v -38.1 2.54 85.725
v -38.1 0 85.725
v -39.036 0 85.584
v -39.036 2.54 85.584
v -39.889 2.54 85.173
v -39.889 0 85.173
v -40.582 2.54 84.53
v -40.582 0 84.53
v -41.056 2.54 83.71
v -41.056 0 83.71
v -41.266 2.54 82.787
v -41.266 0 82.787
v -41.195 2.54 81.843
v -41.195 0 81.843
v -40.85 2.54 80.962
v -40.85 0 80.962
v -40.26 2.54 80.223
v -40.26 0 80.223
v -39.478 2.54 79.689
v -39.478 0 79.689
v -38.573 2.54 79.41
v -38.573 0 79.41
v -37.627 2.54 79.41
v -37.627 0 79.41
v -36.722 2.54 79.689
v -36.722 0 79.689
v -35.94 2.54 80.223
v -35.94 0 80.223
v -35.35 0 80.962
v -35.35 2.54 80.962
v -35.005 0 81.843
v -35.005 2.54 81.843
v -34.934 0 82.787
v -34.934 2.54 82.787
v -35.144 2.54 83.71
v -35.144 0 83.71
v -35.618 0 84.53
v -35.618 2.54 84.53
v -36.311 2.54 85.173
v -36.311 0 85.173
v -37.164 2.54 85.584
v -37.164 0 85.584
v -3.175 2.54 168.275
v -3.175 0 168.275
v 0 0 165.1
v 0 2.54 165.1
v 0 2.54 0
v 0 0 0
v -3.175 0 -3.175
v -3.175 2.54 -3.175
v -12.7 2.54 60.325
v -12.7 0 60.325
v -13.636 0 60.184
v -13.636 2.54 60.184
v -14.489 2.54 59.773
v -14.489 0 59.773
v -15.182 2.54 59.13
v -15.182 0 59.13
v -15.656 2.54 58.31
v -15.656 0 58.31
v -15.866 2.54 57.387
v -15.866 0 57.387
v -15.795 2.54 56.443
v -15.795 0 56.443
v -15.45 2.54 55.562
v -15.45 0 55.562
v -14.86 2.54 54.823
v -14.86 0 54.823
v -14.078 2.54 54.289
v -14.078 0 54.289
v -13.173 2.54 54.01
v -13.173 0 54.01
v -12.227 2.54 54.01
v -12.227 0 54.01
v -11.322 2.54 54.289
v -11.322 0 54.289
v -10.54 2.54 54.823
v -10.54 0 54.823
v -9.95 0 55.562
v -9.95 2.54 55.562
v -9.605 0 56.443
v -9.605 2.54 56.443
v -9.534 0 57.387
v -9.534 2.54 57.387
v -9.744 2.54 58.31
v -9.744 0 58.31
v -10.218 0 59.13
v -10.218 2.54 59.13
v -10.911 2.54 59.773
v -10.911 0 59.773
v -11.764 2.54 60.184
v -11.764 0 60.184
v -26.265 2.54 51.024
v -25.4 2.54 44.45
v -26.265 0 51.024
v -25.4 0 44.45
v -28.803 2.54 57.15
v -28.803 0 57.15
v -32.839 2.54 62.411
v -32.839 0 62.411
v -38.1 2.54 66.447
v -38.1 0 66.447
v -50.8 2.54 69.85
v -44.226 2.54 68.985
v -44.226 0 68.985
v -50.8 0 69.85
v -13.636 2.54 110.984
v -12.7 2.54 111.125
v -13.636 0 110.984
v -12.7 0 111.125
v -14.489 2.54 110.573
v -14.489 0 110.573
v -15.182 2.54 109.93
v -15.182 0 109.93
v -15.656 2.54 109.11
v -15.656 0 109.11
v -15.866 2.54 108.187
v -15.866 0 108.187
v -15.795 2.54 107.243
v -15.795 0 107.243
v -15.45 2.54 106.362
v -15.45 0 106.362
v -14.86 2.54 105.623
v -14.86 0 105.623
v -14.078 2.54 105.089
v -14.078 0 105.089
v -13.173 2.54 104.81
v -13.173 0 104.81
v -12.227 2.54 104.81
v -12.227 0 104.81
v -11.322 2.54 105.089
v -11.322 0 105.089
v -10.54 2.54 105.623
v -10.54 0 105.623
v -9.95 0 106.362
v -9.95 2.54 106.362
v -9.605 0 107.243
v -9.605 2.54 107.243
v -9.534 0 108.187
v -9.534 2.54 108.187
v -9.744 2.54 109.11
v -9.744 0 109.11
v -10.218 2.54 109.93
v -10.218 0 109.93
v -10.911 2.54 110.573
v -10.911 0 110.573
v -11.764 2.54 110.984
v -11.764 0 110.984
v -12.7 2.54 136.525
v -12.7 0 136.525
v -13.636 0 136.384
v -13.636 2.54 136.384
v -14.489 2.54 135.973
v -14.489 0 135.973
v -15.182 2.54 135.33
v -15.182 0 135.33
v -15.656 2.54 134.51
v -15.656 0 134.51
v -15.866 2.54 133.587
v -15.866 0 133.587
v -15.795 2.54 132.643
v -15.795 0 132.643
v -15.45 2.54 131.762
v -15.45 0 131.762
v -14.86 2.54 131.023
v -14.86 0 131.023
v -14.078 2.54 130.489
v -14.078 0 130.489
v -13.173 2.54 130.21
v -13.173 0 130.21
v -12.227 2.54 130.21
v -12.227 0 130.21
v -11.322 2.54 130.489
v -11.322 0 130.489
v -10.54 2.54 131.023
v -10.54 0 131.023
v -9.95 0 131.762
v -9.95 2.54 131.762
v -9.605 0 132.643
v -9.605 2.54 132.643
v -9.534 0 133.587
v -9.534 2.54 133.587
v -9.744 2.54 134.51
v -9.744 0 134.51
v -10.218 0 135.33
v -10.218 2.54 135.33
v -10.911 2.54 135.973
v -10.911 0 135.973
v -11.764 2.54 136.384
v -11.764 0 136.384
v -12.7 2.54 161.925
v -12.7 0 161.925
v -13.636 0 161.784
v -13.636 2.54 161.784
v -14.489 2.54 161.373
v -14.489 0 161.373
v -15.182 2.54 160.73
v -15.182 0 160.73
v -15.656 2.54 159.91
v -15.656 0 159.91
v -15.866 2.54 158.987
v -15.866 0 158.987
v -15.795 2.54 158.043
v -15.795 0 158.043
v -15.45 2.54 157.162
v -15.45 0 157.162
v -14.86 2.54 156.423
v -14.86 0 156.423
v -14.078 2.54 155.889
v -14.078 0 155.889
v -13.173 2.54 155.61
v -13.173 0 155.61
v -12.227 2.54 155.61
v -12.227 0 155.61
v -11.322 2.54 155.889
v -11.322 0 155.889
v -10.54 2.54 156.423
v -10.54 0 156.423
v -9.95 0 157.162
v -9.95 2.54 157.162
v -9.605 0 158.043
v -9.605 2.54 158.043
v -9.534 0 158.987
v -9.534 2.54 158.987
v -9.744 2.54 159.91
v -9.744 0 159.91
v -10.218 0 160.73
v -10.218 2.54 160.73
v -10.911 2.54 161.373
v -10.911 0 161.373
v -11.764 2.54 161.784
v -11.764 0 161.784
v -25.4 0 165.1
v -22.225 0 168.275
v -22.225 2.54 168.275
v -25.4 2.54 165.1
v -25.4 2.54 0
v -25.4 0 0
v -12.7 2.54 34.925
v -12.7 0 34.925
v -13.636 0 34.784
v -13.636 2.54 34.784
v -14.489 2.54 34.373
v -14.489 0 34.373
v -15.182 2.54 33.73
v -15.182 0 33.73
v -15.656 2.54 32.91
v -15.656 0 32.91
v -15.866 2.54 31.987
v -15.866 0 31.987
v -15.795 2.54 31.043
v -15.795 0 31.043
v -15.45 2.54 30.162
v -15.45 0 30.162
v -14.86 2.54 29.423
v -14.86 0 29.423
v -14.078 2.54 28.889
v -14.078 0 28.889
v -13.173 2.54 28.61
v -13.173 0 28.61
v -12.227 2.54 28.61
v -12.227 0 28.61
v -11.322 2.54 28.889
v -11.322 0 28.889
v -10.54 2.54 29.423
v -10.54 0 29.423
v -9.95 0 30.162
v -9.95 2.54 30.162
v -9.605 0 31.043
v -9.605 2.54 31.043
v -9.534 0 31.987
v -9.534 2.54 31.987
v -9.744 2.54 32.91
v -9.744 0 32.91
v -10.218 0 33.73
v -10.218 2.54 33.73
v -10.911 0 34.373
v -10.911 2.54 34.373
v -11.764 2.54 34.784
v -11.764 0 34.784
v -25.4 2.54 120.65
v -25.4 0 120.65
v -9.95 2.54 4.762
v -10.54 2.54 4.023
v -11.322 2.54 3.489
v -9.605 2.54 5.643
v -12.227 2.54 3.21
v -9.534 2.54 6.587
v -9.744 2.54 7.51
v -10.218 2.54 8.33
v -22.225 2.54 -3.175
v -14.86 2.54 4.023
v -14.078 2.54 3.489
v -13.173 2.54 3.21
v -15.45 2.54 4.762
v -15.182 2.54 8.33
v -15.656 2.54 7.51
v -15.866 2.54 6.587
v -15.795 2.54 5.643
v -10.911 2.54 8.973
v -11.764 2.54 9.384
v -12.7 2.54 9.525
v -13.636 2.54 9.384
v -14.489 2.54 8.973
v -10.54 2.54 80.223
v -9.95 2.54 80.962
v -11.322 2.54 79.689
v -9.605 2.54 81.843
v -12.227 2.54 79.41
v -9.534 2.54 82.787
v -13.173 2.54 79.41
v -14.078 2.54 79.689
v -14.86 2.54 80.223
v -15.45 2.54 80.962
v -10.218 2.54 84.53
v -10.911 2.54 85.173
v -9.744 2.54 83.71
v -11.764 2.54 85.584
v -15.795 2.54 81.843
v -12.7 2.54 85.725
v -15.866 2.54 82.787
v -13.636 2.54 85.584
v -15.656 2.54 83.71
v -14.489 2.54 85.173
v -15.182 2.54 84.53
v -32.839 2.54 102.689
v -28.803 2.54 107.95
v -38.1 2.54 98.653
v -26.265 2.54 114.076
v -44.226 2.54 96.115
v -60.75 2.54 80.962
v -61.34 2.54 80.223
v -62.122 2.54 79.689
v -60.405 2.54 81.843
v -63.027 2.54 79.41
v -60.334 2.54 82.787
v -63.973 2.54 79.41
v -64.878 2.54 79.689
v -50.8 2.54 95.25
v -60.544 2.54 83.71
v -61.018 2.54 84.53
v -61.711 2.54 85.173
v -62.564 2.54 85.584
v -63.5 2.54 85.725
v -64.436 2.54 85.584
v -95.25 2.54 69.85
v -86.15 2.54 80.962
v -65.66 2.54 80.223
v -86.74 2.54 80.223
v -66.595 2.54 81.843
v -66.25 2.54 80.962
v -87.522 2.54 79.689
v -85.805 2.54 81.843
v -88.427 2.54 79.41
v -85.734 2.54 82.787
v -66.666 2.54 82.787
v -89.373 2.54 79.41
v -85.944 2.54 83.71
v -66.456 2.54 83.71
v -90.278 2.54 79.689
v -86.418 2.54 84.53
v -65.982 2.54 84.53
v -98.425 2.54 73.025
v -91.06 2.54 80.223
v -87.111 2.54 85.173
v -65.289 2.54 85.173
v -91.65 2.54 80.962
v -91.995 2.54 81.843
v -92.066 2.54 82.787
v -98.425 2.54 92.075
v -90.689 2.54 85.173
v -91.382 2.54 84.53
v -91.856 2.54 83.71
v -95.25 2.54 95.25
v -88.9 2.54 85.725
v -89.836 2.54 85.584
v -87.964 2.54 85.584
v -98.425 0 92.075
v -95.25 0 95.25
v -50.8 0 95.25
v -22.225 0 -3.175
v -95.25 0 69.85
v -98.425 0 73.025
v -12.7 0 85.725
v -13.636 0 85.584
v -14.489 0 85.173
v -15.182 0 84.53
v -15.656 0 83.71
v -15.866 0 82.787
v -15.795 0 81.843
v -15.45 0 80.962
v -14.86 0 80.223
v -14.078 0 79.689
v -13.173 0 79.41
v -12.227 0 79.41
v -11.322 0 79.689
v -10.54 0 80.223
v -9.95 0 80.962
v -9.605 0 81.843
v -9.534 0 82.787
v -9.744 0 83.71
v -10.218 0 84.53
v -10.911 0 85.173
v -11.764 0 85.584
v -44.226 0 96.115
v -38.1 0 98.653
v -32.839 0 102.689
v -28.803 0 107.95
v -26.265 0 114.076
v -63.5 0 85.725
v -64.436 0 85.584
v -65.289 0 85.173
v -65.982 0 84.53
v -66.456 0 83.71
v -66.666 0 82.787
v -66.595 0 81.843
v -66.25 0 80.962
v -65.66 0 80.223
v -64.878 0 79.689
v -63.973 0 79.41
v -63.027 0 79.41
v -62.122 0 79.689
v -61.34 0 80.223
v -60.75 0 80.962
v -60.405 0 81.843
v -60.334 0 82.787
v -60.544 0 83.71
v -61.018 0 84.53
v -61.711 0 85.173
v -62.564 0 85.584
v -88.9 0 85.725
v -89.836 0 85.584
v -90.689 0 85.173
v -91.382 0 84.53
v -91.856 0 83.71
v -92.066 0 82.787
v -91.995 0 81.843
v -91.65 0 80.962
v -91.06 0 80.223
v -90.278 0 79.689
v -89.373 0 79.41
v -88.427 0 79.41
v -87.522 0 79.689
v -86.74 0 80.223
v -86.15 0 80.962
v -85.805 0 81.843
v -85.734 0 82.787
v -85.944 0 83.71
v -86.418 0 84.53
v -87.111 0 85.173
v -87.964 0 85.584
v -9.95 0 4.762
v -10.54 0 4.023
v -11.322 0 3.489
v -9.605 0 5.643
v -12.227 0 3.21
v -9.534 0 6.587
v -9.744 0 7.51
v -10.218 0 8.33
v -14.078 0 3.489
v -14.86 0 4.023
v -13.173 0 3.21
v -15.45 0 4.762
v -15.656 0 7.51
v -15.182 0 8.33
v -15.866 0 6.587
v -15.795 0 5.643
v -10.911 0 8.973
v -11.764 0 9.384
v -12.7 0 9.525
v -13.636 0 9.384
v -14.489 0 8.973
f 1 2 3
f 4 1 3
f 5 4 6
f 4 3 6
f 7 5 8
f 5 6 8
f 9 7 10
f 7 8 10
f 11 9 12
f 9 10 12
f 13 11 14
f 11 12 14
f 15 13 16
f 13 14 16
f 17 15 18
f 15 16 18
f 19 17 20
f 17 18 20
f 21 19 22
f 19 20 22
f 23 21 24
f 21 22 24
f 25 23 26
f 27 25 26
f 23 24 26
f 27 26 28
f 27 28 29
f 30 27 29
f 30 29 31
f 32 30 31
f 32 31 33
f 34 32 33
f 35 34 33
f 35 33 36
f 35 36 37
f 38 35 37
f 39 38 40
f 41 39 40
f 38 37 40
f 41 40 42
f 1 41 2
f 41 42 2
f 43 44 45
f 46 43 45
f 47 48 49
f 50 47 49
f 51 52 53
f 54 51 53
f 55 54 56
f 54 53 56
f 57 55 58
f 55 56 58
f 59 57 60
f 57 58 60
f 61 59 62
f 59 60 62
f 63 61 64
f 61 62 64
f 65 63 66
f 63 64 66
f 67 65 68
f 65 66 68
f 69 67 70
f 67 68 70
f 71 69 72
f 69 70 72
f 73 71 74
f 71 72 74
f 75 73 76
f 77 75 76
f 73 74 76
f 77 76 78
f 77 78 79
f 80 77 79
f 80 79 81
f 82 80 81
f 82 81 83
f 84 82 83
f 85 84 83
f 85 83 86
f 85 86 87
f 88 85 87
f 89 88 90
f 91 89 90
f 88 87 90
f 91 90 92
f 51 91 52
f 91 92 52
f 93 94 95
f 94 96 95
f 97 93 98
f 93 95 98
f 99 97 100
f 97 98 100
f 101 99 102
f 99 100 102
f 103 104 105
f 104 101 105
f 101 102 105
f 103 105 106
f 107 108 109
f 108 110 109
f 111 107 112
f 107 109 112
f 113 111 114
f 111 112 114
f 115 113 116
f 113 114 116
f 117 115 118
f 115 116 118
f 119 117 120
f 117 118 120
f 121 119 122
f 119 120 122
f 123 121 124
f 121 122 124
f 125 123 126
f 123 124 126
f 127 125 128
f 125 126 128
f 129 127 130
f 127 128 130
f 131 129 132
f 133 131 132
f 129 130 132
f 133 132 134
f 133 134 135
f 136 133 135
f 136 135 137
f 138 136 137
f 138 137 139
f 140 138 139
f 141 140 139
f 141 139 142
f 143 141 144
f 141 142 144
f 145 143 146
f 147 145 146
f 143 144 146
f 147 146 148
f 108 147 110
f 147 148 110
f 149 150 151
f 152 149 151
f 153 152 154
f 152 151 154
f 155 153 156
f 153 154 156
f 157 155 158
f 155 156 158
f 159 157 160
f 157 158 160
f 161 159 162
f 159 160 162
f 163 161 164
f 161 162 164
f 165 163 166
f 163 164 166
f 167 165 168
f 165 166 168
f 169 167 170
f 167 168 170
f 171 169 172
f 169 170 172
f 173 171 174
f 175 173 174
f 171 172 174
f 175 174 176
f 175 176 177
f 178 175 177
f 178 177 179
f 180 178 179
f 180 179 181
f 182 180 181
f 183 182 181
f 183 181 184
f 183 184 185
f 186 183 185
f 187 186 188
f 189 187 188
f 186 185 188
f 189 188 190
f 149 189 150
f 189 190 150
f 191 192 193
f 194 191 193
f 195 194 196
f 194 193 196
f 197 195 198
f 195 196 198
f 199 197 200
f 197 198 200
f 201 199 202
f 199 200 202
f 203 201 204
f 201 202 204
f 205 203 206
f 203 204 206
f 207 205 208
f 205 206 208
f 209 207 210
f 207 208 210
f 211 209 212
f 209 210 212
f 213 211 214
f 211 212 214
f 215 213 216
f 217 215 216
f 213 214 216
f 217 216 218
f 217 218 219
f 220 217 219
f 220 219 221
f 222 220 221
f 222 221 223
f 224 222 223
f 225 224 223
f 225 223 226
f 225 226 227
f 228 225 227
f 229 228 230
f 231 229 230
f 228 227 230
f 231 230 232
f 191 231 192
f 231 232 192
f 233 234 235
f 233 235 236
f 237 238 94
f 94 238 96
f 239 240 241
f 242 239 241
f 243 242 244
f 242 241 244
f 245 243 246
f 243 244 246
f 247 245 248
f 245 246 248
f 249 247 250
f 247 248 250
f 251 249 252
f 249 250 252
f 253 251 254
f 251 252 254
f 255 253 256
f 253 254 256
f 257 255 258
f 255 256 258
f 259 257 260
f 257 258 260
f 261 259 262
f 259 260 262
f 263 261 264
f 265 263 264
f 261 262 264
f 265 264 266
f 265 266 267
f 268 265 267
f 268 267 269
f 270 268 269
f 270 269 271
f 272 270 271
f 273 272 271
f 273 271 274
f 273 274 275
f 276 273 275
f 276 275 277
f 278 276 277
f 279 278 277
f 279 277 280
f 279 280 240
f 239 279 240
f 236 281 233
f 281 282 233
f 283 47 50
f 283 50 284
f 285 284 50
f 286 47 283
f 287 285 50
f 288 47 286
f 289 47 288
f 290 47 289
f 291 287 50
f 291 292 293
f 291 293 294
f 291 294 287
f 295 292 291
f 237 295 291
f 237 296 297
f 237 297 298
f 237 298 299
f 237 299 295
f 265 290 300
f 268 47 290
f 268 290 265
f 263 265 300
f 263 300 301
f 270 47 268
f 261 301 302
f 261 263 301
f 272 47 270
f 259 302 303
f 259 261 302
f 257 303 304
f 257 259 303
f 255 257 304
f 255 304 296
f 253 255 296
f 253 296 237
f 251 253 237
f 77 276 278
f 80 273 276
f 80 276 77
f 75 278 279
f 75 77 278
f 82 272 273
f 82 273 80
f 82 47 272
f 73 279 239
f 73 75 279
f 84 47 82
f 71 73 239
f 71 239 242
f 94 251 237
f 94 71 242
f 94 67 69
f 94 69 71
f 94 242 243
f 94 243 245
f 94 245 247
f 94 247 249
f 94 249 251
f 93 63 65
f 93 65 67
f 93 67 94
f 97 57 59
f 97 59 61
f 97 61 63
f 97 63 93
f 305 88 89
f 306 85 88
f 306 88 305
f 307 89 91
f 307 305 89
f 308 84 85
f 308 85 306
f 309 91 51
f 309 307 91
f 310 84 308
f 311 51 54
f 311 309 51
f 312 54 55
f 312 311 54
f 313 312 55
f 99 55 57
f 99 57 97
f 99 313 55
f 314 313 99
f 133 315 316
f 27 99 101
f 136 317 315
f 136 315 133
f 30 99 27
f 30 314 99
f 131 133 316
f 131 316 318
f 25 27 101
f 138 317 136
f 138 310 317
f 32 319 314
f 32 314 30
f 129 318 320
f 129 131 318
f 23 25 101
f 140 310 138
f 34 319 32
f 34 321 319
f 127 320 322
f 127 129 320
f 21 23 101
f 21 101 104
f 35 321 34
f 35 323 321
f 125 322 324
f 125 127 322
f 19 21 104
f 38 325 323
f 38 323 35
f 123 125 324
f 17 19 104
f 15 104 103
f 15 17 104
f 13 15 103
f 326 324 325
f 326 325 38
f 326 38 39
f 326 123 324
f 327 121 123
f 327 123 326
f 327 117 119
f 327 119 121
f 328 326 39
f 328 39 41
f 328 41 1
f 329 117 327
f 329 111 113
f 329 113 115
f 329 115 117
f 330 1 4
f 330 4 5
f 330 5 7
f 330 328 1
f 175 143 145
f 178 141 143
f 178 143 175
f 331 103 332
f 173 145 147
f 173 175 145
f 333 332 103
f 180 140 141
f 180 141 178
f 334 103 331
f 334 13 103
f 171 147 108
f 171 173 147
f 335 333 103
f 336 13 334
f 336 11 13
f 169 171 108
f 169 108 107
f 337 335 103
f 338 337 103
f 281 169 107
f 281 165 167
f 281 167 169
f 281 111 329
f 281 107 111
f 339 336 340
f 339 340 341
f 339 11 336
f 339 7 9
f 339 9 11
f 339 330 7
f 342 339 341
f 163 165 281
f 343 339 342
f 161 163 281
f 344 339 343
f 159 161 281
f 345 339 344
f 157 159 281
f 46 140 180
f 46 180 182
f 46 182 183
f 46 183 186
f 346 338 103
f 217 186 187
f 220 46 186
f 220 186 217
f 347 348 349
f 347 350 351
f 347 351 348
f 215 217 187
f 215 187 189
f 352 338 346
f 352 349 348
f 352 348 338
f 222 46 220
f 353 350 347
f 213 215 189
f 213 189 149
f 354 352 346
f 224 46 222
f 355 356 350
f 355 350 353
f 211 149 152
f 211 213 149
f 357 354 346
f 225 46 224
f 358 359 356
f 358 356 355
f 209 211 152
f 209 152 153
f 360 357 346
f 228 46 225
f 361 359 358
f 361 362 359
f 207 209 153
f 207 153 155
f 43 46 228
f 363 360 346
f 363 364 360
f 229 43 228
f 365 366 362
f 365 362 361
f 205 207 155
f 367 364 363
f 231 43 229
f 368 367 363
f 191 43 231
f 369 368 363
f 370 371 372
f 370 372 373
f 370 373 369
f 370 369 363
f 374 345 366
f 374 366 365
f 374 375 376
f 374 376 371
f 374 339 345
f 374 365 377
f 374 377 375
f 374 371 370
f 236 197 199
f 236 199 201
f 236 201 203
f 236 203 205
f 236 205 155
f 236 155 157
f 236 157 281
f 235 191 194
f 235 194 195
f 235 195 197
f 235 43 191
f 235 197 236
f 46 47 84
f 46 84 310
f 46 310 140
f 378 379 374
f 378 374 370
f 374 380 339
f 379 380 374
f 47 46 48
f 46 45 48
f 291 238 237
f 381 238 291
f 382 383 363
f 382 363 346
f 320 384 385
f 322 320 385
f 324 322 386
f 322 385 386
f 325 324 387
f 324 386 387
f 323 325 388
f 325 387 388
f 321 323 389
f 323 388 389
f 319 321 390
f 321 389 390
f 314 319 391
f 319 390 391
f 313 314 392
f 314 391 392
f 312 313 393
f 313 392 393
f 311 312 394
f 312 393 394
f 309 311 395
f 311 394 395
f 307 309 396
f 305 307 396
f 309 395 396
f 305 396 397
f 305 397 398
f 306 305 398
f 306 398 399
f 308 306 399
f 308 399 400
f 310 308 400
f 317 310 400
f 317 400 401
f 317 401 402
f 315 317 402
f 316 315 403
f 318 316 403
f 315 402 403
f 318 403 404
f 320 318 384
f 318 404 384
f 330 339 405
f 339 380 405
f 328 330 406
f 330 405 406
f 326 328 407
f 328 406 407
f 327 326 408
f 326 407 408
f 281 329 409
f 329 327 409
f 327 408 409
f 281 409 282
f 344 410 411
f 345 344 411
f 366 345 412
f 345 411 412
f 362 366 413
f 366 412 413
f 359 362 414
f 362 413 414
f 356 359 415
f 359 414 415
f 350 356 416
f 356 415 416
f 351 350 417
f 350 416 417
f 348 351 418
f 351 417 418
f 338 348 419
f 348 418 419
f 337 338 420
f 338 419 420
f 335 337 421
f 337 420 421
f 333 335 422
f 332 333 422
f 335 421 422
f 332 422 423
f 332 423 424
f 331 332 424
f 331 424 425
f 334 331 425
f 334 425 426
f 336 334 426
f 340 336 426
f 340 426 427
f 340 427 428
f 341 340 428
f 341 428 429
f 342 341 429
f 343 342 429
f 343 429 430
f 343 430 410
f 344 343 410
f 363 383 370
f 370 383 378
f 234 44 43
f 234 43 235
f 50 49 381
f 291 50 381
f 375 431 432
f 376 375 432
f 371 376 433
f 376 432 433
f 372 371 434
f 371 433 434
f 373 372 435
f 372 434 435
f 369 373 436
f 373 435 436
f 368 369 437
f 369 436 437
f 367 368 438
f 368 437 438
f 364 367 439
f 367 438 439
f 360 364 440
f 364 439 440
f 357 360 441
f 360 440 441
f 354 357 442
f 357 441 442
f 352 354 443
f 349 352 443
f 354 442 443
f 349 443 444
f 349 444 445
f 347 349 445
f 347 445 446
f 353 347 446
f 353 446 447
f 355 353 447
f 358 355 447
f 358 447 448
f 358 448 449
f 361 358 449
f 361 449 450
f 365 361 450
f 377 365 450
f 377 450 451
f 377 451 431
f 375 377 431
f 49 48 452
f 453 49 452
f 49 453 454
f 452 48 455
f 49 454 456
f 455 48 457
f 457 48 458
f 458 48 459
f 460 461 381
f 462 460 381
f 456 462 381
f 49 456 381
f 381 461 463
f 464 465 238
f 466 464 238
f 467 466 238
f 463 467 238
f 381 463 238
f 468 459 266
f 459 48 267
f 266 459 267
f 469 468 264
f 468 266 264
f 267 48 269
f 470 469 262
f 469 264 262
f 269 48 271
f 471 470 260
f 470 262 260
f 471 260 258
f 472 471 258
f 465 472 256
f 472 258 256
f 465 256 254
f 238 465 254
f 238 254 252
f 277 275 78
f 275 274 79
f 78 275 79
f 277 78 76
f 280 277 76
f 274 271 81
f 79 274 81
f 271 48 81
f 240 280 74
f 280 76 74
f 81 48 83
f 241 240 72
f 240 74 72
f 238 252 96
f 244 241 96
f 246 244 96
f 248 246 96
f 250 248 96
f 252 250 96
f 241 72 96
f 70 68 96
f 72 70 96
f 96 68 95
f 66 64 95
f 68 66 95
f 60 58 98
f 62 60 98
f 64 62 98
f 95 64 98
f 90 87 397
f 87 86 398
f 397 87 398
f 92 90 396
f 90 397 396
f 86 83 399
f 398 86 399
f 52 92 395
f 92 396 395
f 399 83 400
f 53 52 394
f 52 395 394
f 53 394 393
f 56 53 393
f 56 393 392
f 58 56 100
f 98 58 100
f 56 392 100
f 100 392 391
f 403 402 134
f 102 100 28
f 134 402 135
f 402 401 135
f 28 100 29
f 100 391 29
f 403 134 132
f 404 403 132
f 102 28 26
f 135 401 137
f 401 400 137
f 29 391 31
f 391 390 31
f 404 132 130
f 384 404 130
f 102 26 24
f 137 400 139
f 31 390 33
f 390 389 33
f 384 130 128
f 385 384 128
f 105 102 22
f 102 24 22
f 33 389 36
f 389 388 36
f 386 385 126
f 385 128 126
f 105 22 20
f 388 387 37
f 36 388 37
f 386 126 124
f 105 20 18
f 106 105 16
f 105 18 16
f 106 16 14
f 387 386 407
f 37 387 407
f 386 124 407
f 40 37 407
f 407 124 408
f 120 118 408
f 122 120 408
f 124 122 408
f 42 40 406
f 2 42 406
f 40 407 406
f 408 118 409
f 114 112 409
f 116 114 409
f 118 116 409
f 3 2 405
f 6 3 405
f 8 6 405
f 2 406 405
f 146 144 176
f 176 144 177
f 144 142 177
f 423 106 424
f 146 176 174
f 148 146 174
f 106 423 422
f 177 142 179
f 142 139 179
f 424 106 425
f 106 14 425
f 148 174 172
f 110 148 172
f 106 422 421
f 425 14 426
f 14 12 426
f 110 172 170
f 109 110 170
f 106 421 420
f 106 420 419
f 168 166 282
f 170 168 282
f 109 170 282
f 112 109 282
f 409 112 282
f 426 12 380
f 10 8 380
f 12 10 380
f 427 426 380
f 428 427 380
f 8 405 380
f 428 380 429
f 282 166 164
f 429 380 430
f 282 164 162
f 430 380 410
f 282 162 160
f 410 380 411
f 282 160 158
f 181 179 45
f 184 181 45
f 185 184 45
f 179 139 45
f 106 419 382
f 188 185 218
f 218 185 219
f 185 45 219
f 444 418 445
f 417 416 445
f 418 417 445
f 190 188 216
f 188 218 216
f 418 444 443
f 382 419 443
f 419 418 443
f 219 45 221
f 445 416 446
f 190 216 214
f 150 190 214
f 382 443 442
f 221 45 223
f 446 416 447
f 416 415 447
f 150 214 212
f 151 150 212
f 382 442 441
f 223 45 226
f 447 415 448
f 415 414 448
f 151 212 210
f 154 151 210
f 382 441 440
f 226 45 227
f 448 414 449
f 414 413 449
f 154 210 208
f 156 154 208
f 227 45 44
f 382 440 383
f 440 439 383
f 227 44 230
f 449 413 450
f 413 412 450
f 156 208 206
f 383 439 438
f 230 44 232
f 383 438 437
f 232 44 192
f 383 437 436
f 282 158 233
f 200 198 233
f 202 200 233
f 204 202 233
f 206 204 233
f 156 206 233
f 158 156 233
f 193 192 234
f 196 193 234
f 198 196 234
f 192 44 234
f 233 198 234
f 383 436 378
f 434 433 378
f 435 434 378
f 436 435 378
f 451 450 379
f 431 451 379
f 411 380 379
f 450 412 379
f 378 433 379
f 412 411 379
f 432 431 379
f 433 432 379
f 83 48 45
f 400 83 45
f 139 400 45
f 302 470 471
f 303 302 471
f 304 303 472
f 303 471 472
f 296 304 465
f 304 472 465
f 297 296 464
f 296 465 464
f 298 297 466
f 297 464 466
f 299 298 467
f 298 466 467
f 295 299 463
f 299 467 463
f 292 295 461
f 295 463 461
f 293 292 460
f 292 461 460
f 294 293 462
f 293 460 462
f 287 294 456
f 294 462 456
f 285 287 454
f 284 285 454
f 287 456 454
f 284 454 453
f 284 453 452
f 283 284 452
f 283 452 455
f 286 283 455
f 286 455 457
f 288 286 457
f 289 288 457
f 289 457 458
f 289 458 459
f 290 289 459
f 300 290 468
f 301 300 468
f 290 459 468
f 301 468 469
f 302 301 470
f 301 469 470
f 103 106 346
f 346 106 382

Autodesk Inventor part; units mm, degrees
ref_plane "YZ Plane" through (0, 0, 0) normal (1, 0, 0) x (0, 1, 0)
ref_plane "XZ Plane" through (0, 0, 0) normal (0, 1, 0) x (-1, 0, 0)
ref_plane "XY Plane" through (0, 0, 0) normal (0, 0, 1) x (1, 0, 0)
sketch "Sketch1" plane through (0, 0, 0) normal (0, 1, 0) x (-1, 0, 0)
  line L0 (3.175, -3.175) -> (22.225, -3.175)
  line L1 (0, 161.925) -> (0, 0)
  line L2 (25.4, 161.925) -> (25.4, 120.65)
  line L3 (50.8, 95.25) -> (95.25, 95.25)
  line L4 (25.4, 0) -> (25.4, 44.45)
  line L5 (50.8, 69.85) -> (95.25, 69.85)
  arc A0 (25.4, 120.65) -> (50.8, 95.25) centre (50.8, 120.65) ccw
  line L6 (0, 0) -> (3.175, -3.175)
  line L7 (25.4, 0) -> (22.225, -3.175)
  arc A1 (50.8, 69.85) -> (25.4, 44.45) centre (50.8, 44.45) ccw
  line L8 (98.425, 73.025) -> (98.425, 92.075)
  line L9 (98.425, 73.025) -> (95.25, 69.85)
  line L10 (95.25, 95.25) -> (98.425, 92.075)
  line L11 (25.4, 161.925) -> (25.4, 165.1)
  line L12 (0, 161.925) -> (0, 165.1)
  line L13 (0, 165.1) -> (0, 165.1)
  line L14 (3.175, 168.275) -> (22.225, 168.275)
  line L15 (25.4, 165.1) -> (25.4, 165.1)
  line L16 (22.225, 168.275) -> (25.4, 165.1)
  line L17 (3.175, 168.275) -> (0, 165.1)
  point P0 (92.075, 69.85)
  point P1 (95.25, 69.85)
  point P2 (0, 168.275)
  point P3 (25.4, 168.275)
  dimension "d6" = 25.4
  dimension "d21" = 25.4
  dimension "d44" = 165.1
  dimension "d63" = 44.45
  dimension "d64" = 44.45
  dimension "d65" = 3.175
  dimension "d67" = 3.175
  dimension "d70" = 3.175
  dimension "d91" = 3.175
  dimension "d92" = 3.175
  dimension "d93" = 3.175
  dimension "d94" = 3.175
extrude "Extrusion1" add sketch "Sketch1" along normal blind 2.54
hole "Hole2" at (-12.7, 2.54, 82.55) direction (0, -1, 0) diameter 6.35 end through all
pattern_linear "Rectangular Pattern4" count 4 spacing 25.4 along (-1, 0, 0) of "Hole2"
pattern_linear "Rectangular Pattern5" count 7 spacing 25.4 along (0, 0, -1) of "Hole2" first direction both ways yes
equation "\"d21\" = d6"
equation "\"d67\" = d65"
equation "\"d92\" = d91"
equation "\"d93\" = d91"
equation "\"d94\" = d93"
equation "\"d79\" = Thickness"
equation "\"BendRadius\" = Thickness"
equation "\"BendReliefWidth\" = Thickness"
equation "\"BendReliefDepth\" = 0.5 * Thickness"
equation "\"CornerReliefSize\" = 4 * Thickness"
equation "\"MinimumRemnant\" = 2 * Thickness"
equation "\"TransitionRadius\" = BendRadius"
equation "\"JacobiRadiusSize\" = BendRadius"
equation "\"GapSize\" = Thickness"
equation "\"Thickness\" = 3.048"
properties part number "T-gusset"
